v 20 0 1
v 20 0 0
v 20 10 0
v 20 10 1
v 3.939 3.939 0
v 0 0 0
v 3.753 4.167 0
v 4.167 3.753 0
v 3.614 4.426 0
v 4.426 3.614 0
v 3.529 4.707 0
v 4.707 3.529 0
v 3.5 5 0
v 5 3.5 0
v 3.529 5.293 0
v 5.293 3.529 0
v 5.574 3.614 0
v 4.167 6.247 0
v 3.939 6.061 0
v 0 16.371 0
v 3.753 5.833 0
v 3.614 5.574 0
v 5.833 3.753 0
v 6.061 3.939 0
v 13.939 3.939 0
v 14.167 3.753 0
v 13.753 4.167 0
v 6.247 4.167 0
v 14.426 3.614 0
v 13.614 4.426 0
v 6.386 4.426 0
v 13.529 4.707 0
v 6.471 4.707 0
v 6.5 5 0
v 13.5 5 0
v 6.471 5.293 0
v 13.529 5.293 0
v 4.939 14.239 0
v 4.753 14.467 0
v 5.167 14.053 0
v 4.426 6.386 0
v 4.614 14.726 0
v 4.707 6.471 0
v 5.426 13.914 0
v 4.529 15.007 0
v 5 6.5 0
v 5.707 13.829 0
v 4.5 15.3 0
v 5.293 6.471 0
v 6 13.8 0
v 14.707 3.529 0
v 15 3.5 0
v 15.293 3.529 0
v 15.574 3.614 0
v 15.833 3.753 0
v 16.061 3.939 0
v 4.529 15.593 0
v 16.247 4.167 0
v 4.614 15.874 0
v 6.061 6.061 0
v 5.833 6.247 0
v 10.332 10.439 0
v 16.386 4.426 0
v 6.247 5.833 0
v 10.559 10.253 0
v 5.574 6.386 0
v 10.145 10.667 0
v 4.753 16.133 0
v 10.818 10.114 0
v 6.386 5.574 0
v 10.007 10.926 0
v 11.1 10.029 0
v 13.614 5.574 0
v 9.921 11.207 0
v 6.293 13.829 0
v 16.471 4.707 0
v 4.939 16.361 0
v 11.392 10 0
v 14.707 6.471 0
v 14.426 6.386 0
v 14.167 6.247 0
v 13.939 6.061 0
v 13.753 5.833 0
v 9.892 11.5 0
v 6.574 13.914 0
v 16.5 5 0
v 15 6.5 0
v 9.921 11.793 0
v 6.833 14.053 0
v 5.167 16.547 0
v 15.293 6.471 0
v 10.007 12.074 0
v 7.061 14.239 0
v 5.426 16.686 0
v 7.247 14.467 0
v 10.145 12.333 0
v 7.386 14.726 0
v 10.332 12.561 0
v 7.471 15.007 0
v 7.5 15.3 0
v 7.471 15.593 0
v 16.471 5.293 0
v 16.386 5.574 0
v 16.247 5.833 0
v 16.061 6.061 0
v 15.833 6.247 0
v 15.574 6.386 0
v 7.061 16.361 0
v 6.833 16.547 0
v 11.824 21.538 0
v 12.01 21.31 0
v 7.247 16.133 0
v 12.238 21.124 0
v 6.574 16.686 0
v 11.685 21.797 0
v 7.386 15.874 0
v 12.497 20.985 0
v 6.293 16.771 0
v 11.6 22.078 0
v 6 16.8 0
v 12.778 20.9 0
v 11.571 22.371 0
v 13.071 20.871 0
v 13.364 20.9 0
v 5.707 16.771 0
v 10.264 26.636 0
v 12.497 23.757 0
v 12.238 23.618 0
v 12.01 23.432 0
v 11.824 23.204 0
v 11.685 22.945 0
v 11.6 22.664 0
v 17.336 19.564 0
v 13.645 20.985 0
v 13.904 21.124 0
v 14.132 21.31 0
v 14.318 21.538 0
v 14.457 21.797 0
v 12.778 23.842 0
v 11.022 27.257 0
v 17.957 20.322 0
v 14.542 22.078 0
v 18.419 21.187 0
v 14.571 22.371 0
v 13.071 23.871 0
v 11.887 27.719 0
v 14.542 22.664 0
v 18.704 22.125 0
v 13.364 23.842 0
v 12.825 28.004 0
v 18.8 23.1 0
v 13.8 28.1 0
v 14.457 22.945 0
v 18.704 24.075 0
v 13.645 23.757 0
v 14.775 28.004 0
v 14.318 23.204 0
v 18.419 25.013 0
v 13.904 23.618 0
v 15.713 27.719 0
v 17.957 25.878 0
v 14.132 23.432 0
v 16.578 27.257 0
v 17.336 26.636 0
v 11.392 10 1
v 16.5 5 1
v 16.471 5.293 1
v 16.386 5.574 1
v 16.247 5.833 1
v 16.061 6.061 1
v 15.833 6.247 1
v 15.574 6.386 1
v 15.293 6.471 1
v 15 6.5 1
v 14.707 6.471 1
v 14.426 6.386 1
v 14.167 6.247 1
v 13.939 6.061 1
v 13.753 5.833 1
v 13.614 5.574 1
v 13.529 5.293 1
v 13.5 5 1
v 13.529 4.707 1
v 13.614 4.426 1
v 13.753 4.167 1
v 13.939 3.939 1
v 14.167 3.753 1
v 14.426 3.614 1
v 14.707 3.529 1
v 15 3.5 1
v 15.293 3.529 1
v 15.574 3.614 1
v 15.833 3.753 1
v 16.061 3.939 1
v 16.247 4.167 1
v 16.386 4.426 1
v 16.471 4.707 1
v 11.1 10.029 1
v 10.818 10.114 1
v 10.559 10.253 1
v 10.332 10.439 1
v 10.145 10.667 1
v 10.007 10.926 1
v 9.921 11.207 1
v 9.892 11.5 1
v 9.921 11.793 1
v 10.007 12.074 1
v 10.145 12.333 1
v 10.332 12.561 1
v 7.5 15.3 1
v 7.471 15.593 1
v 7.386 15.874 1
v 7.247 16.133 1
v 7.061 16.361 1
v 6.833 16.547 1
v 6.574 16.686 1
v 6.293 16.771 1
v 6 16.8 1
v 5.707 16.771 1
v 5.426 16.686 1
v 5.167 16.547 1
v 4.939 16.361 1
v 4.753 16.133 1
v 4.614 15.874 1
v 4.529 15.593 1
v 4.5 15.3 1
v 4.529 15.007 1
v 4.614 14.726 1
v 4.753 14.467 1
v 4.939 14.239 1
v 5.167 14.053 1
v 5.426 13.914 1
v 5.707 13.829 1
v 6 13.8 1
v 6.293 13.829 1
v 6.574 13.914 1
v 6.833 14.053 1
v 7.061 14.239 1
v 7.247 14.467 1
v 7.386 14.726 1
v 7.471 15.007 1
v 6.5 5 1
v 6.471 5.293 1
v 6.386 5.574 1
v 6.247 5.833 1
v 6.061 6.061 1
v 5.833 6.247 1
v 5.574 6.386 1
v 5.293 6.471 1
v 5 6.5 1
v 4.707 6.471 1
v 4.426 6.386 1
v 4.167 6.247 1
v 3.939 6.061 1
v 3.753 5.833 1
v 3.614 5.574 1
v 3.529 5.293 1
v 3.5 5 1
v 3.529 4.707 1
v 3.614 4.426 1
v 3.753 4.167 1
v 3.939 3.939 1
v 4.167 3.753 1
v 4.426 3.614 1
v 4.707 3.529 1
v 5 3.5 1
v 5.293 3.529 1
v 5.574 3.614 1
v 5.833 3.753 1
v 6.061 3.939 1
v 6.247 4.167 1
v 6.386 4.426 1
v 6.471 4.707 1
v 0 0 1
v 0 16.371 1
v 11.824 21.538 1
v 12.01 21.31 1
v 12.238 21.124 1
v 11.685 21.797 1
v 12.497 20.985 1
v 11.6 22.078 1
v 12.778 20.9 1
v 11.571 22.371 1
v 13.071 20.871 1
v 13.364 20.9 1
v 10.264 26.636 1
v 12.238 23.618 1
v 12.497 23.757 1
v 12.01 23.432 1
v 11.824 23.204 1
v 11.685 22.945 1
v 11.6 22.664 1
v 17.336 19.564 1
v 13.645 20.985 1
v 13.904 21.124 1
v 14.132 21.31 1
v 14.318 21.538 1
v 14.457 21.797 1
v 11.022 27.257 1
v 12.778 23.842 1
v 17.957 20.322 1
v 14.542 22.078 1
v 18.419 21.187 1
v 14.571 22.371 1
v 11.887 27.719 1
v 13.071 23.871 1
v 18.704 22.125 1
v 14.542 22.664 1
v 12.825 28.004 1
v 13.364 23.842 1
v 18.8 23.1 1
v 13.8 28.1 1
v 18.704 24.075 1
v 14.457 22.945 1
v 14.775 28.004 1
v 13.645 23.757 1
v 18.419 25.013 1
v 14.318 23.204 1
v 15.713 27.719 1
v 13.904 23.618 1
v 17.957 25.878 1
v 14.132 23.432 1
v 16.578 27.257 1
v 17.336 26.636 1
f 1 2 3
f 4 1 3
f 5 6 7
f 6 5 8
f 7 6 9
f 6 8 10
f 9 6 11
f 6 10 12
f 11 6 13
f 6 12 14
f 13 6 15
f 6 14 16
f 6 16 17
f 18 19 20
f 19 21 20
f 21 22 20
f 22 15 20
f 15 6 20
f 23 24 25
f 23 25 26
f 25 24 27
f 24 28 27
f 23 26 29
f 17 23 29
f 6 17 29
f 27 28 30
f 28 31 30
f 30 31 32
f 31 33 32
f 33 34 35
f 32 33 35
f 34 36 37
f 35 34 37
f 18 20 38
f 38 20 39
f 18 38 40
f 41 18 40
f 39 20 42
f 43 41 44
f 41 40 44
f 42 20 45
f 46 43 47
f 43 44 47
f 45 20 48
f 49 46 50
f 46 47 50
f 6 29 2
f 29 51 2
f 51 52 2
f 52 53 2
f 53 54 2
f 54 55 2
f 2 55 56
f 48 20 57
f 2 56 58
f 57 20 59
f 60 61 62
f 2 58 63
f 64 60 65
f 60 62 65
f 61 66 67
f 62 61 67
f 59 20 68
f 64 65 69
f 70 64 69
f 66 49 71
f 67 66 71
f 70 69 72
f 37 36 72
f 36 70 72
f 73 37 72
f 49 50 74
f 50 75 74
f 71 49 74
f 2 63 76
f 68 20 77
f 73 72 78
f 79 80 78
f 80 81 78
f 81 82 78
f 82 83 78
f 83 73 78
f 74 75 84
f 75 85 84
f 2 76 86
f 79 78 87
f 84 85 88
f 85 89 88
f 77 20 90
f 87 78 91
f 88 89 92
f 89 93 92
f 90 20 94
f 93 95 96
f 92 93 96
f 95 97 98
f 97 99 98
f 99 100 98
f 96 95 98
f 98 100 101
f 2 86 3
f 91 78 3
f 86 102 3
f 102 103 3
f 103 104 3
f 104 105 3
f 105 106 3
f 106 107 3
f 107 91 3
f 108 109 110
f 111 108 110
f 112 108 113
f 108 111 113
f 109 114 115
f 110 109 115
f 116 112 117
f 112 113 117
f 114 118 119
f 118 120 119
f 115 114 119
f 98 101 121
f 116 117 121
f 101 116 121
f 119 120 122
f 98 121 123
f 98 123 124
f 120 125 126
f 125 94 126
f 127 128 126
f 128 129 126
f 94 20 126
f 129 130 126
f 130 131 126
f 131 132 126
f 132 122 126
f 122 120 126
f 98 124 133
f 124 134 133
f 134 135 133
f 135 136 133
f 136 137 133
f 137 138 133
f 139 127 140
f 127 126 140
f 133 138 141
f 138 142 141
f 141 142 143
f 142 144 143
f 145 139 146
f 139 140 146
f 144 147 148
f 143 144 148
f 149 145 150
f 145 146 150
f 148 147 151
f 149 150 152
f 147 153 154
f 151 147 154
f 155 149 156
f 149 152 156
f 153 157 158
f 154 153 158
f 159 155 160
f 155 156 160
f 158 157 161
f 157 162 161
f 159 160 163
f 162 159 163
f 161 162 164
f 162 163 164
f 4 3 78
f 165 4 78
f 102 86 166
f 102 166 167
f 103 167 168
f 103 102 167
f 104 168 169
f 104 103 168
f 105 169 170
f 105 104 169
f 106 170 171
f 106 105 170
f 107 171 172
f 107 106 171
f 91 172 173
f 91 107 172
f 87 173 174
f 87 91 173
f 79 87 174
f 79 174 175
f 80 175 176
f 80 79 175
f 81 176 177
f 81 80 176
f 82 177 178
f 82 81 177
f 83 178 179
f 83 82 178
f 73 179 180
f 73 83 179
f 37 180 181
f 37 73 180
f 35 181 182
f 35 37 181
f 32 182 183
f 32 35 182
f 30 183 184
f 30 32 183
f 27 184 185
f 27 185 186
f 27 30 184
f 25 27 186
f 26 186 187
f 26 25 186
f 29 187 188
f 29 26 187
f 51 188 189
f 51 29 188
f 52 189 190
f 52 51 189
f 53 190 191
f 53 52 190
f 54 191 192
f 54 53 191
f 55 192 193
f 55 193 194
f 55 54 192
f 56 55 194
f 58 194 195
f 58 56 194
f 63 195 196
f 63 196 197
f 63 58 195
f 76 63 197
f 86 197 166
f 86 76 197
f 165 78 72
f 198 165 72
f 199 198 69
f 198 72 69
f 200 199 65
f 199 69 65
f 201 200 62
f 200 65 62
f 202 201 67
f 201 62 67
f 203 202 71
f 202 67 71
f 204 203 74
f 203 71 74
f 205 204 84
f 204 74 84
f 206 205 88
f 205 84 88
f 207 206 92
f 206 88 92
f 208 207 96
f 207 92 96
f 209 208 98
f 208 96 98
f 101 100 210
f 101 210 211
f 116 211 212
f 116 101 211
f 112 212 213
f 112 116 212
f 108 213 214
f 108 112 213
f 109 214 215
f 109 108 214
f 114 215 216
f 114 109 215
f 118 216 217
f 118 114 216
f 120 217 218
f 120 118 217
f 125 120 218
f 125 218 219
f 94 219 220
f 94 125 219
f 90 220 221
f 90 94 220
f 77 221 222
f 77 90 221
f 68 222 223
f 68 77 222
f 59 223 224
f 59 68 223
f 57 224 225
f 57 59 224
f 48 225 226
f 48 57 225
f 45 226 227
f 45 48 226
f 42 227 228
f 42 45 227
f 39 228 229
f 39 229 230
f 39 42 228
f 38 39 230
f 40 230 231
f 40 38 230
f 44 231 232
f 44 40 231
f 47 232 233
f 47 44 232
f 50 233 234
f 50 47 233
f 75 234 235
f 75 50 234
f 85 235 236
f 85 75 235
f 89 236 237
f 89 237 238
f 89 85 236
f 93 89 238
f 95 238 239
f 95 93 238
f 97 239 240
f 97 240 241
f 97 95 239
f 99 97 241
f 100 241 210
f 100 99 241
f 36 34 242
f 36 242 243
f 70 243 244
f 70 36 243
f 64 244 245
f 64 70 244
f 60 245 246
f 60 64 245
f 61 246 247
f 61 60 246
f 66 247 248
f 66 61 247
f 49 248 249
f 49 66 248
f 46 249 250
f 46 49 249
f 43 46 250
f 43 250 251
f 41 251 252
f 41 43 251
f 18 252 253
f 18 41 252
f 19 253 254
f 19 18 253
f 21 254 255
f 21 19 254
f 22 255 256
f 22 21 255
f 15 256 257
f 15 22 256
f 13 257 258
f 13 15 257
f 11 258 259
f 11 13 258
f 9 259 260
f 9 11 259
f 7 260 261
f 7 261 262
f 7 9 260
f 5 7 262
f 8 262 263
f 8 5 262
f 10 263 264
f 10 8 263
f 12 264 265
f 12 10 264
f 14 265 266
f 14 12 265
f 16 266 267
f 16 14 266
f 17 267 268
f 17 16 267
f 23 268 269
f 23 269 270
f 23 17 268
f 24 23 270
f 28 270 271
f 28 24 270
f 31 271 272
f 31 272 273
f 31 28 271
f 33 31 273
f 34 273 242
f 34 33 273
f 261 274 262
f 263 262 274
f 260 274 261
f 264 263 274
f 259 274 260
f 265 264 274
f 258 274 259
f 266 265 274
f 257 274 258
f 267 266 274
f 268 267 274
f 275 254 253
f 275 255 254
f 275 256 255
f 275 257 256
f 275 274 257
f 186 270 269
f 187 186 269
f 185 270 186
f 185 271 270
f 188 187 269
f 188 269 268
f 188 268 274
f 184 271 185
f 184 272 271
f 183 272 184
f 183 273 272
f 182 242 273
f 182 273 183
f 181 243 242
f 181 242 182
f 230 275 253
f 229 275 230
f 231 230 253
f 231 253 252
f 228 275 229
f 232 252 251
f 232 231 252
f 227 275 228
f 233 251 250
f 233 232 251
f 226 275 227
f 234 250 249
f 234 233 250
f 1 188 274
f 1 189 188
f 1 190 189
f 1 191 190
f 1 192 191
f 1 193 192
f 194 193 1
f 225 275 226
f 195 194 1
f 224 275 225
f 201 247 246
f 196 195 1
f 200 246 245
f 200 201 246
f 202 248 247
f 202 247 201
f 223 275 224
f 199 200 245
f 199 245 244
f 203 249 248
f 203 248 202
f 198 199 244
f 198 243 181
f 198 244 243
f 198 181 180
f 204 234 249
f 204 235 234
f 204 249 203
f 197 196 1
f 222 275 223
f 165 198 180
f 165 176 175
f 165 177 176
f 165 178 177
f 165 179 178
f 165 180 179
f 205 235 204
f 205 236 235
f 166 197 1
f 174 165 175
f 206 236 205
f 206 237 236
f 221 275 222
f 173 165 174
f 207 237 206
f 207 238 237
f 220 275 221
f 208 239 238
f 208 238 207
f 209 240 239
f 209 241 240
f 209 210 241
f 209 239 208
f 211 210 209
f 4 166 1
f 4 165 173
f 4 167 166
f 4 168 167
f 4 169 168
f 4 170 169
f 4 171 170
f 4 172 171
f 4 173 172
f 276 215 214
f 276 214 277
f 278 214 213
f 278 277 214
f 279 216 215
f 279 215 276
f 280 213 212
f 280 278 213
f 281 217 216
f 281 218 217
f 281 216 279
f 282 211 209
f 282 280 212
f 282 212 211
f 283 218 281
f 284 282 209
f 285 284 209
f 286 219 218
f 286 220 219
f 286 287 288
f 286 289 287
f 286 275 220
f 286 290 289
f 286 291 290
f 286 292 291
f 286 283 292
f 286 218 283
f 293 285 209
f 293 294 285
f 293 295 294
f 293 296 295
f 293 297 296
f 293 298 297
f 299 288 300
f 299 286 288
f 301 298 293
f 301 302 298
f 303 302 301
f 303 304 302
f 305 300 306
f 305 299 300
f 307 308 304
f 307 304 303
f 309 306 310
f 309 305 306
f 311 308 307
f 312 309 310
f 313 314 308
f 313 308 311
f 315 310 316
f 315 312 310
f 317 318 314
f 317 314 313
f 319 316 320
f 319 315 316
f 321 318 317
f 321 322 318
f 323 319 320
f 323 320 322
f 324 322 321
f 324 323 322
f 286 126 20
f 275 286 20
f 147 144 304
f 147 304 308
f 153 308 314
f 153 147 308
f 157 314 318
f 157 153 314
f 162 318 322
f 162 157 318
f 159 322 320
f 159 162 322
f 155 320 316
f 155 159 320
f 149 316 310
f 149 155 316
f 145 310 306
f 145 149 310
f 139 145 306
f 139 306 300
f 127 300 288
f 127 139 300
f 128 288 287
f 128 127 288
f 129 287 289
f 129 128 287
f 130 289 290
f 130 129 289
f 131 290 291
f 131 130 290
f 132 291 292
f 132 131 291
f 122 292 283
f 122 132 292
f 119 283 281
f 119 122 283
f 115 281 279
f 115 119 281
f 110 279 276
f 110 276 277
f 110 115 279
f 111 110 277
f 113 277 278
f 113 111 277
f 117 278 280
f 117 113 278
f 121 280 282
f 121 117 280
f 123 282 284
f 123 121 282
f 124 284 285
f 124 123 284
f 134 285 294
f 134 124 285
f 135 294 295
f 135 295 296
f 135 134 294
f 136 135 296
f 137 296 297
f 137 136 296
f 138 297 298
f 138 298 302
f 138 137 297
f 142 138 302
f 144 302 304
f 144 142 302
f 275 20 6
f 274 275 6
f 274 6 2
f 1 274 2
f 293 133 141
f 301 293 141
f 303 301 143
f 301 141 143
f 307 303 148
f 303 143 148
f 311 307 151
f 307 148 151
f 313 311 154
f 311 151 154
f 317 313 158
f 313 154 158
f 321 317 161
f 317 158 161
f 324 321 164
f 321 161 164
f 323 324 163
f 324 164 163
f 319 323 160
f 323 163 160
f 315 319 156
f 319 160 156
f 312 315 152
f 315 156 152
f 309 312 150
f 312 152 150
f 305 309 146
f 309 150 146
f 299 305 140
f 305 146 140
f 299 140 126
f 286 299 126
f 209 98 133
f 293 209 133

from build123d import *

# Parameters (mm, degrees)
ESQUISSE1_R        = 1.5
BOSS_EXTRU_1_DEPTH = 1


with BuildPart() as part:
    # Esquisse1 → Boss.-Extru.1 (new body)
    with BuildSketch(Plane.XY):
        with BuildLine():
            Line((0, 0), (20, 0))
            Line((20, 0), (20, 10))
            Line((20, 10), (11.392388155, 10))
            ThreePointArc((11.392388155, 10), (10.006568857, 10.925974851), (10.331727984, 12.560660172))
            Line((10.331727984, 12.560660172), (17.335533906, 19.564466094))
            ThreePointArc((17.335533906, 19.564466094), (17.335533906, 26.635533906), (10.264466094, 26.635533906))
            Line((10.264466094, 26.635533906), (0, 16.371067812))
            Line((0, 16.371067812), (0, 0))
        make_face()
        with Locations((5, 5)):
            Circle(ESQUISSE1_R, mode=Mode.SUBTRACT)
        with Locations((15, 5)):
            Circle(ESQUISSE1_R, mode=Mode.SUBTRACT)
        with Locations((6, 15.3)):
            Circle(ESQUISSE1_R, mode=Mode.SUBTRACT)
        with Locations((13.071067812, 22.371067812)):
            Circle(ESQUISSE1_R, mode=Mode.SUBTRACT)
    extrude(amount=BOSS_EXTRU_1_DEPTH)


solid = part.part
